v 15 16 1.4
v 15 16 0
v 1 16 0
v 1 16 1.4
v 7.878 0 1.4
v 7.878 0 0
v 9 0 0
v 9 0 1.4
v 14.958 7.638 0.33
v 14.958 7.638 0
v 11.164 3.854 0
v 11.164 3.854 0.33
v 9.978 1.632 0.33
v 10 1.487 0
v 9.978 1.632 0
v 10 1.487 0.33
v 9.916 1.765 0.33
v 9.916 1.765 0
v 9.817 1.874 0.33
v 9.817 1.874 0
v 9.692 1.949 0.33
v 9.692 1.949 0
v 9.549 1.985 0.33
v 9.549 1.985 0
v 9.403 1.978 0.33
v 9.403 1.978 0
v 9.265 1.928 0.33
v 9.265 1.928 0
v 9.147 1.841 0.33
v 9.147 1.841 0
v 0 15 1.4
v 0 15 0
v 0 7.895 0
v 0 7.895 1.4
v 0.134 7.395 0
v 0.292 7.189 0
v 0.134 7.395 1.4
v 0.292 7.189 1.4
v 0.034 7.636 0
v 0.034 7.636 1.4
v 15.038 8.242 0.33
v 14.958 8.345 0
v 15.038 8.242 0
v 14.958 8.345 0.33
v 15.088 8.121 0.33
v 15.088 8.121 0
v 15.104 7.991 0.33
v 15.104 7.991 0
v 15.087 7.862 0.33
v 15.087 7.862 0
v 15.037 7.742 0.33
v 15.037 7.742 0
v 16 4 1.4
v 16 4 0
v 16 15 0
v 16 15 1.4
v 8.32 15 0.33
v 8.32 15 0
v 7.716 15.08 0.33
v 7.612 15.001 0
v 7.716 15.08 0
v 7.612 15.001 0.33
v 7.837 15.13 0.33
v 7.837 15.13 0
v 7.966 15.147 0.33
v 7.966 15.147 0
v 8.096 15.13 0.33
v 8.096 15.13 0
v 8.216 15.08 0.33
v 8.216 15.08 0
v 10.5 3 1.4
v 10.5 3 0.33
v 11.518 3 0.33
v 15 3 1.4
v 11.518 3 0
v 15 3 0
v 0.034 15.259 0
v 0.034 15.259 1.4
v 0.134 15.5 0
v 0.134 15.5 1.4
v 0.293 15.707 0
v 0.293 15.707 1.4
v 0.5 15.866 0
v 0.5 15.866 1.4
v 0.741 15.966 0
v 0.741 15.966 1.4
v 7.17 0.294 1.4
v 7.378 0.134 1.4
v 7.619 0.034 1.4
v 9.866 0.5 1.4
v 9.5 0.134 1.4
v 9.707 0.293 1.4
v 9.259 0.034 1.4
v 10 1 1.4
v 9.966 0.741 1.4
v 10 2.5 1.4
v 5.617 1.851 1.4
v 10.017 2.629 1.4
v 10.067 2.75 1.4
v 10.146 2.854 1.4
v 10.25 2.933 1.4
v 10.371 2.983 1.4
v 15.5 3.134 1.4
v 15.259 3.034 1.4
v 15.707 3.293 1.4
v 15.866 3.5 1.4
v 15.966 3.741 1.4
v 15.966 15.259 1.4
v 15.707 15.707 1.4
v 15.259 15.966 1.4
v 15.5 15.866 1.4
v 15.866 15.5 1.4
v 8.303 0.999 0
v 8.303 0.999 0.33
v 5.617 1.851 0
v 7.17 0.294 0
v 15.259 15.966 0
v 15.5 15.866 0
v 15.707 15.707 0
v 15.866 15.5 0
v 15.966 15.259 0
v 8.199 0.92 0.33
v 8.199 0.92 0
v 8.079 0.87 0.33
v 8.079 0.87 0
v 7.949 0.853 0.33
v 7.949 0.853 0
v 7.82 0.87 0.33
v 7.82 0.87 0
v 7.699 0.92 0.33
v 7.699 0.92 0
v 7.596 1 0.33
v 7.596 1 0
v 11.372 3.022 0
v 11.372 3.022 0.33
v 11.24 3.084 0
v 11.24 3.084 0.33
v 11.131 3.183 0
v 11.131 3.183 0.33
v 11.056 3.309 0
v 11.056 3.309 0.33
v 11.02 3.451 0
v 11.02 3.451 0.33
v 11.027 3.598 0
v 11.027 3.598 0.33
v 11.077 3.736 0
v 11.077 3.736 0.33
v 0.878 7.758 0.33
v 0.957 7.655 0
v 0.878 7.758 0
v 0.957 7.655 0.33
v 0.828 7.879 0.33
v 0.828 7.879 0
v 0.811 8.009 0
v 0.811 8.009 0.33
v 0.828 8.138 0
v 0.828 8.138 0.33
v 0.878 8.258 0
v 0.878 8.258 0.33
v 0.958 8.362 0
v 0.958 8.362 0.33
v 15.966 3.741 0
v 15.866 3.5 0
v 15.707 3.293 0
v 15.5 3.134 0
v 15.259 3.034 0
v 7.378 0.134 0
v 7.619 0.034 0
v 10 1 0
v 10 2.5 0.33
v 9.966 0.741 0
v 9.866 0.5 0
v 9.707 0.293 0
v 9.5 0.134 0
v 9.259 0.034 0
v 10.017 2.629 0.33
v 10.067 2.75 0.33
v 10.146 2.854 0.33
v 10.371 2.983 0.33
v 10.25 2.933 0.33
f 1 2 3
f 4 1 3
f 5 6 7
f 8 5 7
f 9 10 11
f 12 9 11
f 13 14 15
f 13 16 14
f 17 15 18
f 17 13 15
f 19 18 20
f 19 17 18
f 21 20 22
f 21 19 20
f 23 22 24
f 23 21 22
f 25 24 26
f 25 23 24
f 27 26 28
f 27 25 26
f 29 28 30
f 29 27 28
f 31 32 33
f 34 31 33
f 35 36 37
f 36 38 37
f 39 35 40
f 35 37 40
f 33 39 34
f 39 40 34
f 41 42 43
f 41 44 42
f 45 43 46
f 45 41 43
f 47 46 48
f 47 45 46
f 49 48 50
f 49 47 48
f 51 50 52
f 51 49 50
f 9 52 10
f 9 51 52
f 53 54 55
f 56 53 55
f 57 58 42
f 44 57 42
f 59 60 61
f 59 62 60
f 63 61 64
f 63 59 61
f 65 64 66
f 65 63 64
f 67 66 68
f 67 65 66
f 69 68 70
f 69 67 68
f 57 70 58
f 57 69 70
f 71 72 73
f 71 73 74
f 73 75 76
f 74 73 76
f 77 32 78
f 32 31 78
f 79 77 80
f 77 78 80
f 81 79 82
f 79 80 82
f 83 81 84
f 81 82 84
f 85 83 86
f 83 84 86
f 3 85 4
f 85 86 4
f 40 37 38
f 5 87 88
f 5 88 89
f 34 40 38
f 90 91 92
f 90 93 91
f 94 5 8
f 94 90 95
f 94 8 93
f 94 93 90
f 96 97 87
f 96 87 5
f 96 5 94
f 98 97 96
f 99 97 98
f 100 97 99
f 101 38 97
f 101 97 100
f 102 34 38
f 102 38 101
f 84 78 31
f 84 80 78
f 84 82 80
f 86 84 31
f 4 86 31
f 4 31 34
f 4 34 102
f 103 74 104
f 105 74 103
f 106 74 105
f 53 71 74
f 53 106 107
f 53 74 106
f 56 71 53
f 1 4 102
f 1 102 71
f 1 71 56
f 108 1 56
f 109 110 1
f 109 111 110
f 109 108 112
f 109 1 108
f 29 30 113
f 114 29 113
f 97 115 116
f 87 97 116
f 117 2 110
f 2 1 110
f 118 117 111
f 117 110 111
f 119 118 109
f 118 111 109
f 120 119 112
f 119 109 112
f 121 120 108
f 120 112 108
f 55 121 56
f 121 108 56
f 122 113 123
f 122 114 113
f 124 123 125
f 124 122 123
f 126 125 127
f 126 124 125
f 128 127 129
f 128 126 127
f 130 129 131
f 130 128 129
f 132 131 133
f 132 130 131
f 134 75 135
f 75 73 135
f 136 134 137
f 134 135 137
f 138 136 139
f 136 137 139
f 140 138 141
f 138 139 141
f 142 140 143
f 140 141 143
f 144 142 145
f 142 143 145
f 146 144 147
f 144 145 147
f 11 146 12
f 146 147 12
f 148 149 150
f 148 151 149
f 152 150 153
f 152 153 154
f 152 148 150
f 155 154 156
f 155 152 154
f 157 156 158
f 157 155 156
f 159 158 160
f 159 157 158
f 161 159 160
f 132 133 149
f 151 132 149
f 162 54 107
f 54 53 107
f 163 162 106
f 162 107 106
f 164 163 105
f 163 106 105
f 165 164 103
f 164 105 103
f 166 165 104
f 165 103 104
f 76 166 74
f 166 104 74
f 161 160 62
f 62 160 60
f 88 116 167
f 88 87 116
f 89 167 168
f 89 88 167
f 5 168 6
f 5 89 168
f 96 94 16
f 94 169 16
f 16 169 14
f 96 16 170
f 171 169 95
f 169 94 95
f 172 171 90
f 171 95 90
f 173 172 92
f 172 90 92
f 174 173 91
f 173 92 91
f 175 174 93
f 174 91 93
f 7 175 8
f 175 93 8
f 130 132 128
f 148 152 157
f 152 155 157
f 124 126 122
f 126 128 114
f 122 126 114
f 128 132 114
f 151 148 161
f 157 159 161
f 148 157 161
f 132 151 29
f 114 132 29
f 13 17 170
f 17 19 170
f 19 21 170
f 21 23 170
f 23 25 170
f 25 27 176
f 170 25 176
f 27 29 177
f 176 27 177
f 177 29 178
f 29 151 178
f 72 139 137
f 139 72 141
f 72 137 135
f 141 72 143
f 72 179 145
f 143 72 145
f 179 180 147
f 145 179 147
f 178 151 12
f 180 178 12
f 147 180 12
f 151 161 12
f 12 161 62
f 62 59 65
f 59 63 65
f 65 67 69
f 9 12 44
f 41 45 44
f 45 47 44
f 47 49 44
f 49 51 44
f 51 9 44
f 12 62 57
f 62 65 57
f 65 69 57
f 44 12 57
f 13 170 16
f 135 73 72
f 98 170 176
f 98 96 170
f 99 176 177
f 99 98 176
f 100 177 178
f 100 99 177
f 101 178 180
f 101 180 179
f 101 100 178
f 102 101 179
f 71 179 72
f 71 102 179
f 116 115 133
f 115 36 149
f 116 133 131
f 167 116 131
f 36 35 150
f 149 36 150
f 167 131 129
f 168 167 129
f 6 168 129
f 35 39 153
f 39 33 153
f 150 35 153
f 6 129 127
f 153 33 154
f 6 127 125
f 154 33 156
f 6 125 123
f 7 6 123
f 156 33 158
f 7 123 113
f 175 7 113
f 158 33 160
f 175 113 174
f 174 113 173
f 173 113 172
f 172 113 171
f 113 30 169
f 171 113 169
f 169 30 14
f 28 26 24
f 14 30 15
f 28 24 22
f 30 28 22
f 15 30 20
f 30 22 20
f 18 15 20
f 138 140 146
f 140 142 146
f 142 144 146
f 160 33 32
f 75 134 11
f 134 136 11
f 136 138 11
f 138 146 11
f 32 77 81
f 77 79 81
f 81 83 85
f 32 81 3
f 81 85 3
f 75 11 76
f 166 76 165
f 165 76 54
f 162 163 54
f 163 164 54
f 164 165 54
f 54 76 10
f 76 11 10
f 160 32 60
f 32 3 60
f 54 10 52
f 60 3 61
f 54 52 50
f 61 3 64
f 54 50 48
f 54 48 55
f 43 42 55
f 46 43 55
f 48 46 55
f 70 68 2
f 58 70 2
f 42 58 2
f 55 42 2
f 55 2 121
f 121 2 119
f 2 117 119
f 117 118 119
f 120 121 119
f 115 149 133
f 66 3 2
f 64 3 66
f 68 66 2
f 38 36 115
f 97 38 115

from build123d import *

# Parameters (mm, degrees)
F1_DEPTH = 1.4
F2_START = 0.33
F2_DEPTH = 1.07
F3_R     = 1
F4_F1_R  = 0.5
F4_F2_R  = 0.5


# Not quite as in the source:
# - two fillets or chamfers of one size are made in one step
# - a feature names something its author has since deleted; it is built from what else it names


with BuildPart() as f1:
    # F0 (on Top) → F1 (new body)
    with BuildSketch(Plane.XY):
        Polygon((5.6168799675, 1.8509632612), (7.4634256667, 0), (10, 0), (10, 2.6923049909), (7.9488945061, 0.6460947242), (0.6037752352, 8.0087860049), (7.9664665159, 15.3539052758), (15.3115857869, 7.9912139951), (10.3084311196, 3), (16, 3), (16, 16), (0, 16), (0, 7.4812807055), (2.1561987725, 5.3199235762), align=None)
    extrude(amount=F1_DEPTH)

    # F0 (on Top) → F2 (join)
    with BuildSketch(Plane.XY.offset(F2_START)):
        Polygon((7.9488945061, 0.6460947242), (10, 2.6923049909), (10, 3), (10.3084311196, 3), (15.3115857869, 7.9912139951), (7.9664665159, 15.3539052758), (0.6037752352, 8.0087860049), align=None)
    extrude(amount=F2_DEPTH)

    # F3
    f3_edges = [f1.edges().sort_by_distance(p)[0] for p in [
        (16, 16, 0.7),
        (0, 16, 0.7),
        (10, 0, 0.7),
        (16, 3, 0.7),
        (0, 7.481281, 0.7),
        (7.463426, 0, 0.7),
    ]]
    fillet(f3_edges, radius=F3_R)

    # F4: fillet of radius 0.5 on 7 edges, made by hand

    # F4_f1
    f4_f1_edges = [f1.edges().sort_by_distance(p)[0] for p in [
        (10.3084311196, 3, 0.165),
        (10, 2.6923049909, 0.165),
    ]]
    fillet(f4_f1_edges, radius=F4_F1_R)

    # F4_f2
    f4_f2_edges = [f1.edges().sort_by_distance(p)[0] for p in [
        (7.9664665159, 15.3539052758, 0.165),
        (0.6037752352, 8.0087860049, 0.165),
        (7.9488945061, 0.6460947242, 0.165),
        (15.3115857869, 7.9912139951, 0.165),
        (10, 3, 0.865),
    ]]
    fillet(f4_f2_edges, radius=F4_F2_R)


solid = f1.part
